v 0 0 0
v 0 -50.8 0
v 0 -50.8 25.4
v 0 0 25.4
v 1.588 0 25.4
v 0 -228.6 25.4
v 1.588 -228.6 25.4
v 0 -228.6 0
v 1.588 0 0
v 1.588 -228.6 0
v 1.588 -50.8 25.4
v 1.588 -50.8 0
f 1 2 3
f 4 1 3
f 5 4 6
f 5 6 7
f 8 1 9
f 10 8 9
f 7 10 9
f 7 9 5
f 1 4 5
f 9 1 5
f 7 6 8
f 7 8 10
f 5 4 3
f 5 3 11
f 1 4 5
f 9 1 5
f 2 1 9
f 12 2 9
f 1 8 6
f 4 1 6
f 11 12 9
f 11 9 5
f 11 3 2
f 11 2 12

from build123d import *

# Parameters (mm, degrees)
F0_W     = 1.5875
F0_H     = 25.4
F1_DEPTH = 228.6
F2_DEPTH = 50.8
F3_DEPTH = 25.4


with BuildPart() as f1:
    # F0 (on Front) → F1 (new body)
    with BuildSketch(Plane.XZ):
        with Locations((0.79375, 12.7)):
            Rectangle(F0_W, F0_H)
    extrude(amount=F1_DEPTH)


with BuildPart() as f2:
    # F0 (on Front) → F2 (new body)
    with BuildSketch(Plane.XZ):
        with Locations((0.79375, 12.7)):
            Rectangle(F0_W, F0_H)
    extrude(amount=F2_DEPTH)


with BuildPart() as f3:
    # F0 (on Front) → F3 (new body)
    with BuildSketch(Plane.XZ):
        with Locations((0.79375, 12.7)):
            Rectangle(F0_W, F0_H)
    extrude(amount=F3_DEPTH)


solid = Compound([f1.part, f2.part])
